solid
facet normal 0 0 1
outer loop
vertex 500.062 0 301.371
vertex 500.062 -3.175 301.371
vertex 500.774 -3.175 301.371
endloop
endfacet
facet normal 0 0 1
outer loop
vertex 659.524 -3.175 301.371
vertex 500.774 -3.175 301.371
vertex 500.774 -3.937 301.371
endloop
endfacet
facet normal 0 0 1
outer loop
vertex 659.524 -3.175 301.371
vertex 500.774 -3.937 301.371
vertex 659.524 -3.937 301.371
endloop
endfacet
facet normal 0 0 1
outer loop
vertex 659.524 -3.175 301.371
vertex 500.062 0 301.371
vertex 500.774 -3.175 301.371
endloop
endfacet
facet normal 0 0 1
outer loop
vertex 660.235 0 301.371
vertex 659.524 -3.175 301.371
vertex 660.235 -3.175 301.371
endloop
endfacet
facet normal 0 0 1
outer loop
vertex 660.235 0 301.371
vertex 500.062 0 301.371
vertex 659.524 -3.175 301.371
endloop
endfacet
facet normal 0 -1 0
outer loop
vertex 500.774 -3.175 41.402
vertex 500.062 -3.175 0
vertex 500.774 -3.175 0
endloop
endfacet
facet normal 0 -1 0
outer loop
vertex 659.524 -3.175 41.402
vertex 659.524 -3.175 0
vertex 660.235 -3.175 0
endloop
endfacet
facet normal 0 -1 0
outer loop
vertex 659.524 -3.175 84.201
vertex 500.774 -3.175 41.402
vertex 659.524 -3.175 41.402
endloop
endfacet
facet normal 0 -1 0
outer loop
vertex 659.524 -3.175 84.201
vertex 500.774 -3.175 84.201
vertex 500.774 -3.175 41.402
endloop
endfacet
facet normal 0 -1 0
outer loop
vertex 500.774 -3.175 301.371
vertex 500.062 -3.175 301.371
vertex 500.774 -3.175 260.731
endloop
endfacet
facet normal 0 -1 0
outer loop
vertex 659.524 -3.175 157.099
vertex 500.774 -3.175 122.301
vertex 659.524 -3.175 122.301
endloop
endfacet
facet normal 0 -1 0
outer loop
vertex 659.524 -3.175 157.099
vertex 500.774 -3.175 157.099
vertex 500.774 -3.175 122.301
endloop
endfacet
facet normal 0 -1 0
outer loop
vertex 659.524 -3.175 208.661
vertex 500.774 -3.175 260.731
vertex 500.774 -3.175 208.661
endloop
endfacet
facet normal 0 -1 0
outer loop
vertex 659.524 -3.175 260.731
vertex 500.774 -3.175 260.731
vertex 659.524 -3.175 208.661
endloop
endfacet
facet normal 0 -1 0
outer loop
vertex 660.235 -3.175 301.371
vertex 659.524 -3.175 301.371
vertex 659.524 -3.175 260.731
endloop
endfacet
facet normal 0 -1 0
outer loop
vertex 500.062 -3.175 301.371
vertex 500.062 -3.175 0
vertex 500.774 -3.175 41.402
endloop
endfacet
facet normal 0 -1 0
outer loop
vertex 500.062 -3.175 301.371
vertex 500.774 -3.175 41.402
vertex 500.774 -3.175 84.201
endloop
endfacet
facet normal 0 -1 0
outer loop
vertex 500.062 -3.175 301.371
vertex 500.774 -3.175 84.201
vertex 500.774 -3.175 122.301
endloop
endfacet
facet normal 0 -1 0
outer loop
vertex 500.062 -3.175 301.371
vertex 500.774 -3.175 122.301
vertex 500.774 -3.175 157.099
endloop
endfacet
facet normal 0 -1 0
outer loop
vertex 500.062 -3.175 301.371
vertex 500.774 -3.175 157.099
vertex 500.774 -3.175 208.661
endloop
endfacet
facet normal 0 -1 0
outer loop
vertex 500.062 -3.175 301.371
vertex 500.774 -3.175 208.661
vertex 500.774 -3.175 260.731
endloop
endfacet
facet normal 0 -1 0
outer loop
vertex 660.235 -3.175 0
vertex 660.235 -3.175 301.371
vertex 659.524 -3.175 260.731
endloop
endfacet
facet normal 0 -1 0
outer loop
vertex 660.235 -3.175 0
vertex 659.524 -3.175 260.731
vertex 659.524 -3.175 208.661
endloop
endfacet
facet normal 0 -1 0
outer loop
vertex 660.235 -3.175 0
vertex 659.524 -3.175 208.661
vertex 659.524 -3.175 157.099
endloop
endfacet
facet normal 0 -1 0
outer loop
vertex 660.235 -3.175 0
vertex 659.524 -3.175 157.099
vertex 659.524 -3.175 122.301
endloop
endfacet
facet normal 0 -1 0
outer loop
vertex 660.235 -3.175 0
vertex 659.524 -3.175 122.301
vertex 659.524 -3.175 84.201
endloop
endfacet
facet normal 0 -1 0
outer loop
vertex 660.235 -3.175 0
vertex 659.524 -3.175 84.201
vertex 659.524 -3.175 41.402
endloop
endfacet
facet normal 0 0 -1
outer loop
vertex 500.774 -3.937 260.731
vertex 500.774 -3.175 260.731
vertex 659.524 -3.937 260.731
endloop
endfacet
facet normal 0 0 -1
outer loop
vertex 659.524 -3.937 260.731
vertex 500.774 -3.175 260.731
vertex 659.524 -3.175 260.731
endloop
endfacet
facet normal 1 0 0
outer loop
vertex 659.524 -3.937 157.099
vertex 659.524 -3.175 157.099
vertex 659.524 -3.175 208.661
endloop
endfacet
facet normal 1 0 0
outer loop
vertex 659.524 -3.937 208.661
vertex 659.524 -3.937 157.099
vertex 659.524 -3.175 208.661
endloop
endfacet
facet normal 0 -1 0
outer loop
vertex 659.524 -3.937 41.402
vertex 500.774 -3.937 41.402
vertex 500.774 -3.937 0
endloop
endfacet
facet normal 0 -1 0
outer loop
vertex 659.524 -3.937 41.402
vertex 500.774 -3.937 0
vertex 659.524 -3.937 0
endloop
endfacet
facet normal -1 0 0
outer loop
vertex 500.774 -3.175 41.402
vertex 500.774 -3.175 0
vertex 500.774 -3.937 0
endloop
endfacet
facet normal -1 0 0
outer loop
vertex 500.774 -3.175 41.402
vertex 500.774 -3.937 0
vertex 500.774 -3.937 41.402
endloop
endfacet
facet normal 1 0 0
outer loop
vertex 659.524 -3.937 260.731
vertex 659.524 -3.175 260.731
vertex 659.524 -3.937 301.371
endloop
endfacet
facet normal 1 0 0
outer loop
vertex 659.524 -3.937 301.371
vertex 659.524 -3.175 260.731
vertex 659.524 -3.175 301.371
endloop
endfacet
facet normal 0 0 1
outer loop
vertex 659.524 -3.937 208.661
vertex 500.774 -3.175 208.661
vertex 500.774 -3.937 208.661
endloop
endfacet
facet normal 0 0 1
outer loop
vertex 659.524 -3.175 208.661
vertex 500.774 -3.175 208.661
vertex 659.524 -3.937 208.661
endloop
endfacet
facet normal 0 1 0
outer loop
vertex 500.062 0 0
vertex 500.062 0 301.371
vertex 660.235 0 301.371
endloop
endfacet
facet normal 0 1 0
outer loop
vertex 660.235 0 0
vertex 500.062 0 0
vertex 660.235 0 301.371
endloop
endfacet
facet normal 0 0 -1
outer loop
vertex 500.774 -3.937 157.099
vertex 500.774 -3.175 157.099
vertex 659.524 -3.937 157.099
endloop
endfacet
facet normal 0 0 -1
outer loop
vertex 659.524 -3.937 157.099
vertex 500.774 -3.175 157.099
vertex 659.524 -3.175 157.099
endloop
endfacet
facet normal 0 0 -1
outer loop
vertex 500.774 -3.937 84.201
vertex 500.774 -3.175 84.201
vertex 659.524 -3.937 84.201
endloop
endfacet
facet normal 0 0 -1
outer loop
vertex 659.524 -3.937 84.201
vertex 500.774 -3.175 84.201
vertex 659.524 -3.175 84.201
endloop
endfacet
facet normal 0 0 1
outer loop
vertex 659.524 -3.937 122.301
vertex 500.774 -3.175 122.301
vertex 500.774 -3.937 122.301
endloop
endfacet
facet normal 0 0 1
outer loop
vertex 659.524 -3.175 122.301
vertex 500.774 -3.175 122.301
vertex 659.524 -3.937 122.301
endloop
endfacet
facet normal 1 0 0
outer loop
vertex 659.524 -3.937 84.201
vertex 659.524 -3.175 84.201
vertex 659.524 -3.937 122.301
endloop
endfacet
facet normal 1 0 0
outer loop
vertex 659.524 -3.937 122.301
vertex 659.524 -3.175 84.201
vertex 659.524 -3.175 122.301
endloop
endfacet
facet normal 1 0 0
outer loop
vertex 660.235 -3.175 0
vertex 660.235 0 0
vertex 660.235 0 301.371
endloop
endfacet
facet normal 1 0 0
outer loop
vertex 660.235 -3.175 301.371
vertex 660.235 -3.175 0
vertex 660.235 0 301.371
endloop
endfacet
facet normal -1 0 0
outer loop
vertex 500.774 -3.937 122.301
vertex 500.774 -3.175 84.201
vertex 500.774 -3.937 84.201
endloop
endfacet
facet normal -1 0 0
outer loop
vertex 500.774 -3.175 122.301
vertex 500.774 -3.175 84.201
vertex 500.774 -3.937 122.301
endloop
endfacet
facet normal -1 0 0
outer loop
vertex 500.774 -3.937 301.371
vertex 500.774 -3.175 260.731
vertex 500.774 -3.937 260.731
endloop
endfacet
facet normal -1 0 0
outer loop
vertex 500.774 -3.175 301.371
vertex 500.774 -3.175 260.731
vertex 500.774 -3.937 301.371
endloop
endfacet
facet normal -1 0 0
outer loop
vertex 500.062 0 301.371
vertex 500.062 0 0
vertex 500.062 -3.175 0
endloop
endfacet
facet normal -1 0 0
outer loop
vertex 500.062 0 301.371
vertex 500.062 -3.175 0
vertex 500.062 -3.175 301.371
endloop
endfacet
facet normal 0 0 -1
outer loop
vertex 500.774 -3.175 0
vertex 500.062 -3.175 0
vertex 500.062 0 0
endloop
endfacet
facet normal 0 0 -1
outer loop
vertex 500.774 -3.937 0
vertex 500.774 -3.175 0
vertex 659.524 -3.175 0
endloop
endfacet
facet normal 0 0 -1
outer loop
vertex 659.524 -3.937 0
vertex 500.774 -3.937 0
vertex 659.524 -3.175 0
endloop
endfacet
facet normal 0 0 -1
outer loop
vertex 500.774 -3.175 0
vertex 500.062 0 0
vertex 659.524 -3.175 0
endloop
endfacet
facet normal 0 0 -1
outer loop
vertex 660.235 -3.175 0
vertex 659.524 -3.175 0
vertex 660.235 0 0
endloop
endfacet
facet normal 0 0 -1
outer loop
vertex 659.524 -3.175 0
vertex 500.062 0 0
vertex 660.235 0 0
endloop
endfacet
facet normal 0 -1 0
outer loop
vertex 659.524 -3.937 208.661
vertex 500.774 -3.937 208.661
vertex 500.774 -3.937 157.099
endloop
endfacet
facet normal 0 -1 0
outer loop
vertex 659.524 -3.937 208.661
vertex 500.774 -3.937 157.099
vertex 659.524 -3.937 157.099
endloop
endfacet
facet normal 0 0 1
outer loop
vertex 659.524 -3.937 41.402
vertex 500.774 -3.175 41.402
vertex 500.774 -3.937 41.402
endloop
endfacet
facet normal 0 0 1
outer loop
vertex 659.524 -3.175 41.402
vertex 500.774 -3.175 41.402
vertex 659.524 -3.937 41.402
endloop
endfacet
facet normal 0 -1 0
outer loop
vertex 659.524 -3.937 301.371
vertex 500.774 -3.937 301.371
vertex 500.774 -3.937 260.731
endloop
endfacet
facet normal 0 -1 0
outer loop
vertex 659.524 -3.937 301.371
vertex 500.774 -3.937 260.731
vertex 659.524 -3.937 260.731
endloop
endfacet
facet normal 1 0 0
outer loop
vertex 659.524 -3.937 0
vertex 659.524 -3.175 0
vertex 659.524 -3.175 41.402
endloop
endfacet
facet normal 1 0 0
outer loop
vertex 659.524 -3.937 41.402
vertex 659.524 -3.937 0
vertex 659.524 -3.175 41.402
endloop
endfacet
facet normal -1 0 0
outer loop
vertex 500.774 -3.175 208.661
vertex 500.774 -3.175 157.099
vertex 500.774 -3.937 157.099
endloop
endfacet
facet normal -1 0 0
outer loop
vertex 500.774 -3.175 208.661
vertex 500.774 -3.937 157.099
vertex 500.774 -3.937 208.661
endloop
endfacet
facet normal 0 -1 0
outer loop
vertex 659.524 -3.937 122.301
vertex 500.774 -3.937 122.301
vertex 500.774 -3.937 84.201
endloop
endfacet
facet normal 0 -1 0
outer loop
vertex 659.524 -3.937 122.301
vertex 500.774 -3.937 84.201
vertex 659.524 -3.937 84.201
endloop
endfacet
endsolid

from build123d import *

# Parameters (mm, degrees)
F0_W     = 160.1724
F0_H     = 301.371
F1_DEPTH = 3.175
F2_W     = 158.75
F2_H     = 40.64
F2_H_2   = 51.562
F2_H_3   = 38.1
F2_H_4   = 41.402
F3_DEPTH = 0.762


with BuildPart() as f1:
    # F0 (on Front) → F1 (new body)
    with BuildSketch(Plane.XZ):
        with Locations((580.1487, 150.6855)):
            Rectangle(F0_W, F0_H)
    extrude(amount=F1_DEPTH)

    # F2 (on face) → F3 (join)
    with BuildSketch(Plane.XZ.offset(3.175)):
        with Locations((580.1487, 281.051)):
            Rectangle(F2_W, F2_H)
        with Locations((580.1487, 182.88)):
            Rectangle(F2_W, F2_H_2)
        with Locations((580.1487, 103.251)):
            Rectangle(F2_W, F2_H_3)
        with Locations((580.1487, 20.701)):
            Rectangle(F2_W, F2_H_4)
    extrude(amount=F3_DEPTH)


solid = f1.part
